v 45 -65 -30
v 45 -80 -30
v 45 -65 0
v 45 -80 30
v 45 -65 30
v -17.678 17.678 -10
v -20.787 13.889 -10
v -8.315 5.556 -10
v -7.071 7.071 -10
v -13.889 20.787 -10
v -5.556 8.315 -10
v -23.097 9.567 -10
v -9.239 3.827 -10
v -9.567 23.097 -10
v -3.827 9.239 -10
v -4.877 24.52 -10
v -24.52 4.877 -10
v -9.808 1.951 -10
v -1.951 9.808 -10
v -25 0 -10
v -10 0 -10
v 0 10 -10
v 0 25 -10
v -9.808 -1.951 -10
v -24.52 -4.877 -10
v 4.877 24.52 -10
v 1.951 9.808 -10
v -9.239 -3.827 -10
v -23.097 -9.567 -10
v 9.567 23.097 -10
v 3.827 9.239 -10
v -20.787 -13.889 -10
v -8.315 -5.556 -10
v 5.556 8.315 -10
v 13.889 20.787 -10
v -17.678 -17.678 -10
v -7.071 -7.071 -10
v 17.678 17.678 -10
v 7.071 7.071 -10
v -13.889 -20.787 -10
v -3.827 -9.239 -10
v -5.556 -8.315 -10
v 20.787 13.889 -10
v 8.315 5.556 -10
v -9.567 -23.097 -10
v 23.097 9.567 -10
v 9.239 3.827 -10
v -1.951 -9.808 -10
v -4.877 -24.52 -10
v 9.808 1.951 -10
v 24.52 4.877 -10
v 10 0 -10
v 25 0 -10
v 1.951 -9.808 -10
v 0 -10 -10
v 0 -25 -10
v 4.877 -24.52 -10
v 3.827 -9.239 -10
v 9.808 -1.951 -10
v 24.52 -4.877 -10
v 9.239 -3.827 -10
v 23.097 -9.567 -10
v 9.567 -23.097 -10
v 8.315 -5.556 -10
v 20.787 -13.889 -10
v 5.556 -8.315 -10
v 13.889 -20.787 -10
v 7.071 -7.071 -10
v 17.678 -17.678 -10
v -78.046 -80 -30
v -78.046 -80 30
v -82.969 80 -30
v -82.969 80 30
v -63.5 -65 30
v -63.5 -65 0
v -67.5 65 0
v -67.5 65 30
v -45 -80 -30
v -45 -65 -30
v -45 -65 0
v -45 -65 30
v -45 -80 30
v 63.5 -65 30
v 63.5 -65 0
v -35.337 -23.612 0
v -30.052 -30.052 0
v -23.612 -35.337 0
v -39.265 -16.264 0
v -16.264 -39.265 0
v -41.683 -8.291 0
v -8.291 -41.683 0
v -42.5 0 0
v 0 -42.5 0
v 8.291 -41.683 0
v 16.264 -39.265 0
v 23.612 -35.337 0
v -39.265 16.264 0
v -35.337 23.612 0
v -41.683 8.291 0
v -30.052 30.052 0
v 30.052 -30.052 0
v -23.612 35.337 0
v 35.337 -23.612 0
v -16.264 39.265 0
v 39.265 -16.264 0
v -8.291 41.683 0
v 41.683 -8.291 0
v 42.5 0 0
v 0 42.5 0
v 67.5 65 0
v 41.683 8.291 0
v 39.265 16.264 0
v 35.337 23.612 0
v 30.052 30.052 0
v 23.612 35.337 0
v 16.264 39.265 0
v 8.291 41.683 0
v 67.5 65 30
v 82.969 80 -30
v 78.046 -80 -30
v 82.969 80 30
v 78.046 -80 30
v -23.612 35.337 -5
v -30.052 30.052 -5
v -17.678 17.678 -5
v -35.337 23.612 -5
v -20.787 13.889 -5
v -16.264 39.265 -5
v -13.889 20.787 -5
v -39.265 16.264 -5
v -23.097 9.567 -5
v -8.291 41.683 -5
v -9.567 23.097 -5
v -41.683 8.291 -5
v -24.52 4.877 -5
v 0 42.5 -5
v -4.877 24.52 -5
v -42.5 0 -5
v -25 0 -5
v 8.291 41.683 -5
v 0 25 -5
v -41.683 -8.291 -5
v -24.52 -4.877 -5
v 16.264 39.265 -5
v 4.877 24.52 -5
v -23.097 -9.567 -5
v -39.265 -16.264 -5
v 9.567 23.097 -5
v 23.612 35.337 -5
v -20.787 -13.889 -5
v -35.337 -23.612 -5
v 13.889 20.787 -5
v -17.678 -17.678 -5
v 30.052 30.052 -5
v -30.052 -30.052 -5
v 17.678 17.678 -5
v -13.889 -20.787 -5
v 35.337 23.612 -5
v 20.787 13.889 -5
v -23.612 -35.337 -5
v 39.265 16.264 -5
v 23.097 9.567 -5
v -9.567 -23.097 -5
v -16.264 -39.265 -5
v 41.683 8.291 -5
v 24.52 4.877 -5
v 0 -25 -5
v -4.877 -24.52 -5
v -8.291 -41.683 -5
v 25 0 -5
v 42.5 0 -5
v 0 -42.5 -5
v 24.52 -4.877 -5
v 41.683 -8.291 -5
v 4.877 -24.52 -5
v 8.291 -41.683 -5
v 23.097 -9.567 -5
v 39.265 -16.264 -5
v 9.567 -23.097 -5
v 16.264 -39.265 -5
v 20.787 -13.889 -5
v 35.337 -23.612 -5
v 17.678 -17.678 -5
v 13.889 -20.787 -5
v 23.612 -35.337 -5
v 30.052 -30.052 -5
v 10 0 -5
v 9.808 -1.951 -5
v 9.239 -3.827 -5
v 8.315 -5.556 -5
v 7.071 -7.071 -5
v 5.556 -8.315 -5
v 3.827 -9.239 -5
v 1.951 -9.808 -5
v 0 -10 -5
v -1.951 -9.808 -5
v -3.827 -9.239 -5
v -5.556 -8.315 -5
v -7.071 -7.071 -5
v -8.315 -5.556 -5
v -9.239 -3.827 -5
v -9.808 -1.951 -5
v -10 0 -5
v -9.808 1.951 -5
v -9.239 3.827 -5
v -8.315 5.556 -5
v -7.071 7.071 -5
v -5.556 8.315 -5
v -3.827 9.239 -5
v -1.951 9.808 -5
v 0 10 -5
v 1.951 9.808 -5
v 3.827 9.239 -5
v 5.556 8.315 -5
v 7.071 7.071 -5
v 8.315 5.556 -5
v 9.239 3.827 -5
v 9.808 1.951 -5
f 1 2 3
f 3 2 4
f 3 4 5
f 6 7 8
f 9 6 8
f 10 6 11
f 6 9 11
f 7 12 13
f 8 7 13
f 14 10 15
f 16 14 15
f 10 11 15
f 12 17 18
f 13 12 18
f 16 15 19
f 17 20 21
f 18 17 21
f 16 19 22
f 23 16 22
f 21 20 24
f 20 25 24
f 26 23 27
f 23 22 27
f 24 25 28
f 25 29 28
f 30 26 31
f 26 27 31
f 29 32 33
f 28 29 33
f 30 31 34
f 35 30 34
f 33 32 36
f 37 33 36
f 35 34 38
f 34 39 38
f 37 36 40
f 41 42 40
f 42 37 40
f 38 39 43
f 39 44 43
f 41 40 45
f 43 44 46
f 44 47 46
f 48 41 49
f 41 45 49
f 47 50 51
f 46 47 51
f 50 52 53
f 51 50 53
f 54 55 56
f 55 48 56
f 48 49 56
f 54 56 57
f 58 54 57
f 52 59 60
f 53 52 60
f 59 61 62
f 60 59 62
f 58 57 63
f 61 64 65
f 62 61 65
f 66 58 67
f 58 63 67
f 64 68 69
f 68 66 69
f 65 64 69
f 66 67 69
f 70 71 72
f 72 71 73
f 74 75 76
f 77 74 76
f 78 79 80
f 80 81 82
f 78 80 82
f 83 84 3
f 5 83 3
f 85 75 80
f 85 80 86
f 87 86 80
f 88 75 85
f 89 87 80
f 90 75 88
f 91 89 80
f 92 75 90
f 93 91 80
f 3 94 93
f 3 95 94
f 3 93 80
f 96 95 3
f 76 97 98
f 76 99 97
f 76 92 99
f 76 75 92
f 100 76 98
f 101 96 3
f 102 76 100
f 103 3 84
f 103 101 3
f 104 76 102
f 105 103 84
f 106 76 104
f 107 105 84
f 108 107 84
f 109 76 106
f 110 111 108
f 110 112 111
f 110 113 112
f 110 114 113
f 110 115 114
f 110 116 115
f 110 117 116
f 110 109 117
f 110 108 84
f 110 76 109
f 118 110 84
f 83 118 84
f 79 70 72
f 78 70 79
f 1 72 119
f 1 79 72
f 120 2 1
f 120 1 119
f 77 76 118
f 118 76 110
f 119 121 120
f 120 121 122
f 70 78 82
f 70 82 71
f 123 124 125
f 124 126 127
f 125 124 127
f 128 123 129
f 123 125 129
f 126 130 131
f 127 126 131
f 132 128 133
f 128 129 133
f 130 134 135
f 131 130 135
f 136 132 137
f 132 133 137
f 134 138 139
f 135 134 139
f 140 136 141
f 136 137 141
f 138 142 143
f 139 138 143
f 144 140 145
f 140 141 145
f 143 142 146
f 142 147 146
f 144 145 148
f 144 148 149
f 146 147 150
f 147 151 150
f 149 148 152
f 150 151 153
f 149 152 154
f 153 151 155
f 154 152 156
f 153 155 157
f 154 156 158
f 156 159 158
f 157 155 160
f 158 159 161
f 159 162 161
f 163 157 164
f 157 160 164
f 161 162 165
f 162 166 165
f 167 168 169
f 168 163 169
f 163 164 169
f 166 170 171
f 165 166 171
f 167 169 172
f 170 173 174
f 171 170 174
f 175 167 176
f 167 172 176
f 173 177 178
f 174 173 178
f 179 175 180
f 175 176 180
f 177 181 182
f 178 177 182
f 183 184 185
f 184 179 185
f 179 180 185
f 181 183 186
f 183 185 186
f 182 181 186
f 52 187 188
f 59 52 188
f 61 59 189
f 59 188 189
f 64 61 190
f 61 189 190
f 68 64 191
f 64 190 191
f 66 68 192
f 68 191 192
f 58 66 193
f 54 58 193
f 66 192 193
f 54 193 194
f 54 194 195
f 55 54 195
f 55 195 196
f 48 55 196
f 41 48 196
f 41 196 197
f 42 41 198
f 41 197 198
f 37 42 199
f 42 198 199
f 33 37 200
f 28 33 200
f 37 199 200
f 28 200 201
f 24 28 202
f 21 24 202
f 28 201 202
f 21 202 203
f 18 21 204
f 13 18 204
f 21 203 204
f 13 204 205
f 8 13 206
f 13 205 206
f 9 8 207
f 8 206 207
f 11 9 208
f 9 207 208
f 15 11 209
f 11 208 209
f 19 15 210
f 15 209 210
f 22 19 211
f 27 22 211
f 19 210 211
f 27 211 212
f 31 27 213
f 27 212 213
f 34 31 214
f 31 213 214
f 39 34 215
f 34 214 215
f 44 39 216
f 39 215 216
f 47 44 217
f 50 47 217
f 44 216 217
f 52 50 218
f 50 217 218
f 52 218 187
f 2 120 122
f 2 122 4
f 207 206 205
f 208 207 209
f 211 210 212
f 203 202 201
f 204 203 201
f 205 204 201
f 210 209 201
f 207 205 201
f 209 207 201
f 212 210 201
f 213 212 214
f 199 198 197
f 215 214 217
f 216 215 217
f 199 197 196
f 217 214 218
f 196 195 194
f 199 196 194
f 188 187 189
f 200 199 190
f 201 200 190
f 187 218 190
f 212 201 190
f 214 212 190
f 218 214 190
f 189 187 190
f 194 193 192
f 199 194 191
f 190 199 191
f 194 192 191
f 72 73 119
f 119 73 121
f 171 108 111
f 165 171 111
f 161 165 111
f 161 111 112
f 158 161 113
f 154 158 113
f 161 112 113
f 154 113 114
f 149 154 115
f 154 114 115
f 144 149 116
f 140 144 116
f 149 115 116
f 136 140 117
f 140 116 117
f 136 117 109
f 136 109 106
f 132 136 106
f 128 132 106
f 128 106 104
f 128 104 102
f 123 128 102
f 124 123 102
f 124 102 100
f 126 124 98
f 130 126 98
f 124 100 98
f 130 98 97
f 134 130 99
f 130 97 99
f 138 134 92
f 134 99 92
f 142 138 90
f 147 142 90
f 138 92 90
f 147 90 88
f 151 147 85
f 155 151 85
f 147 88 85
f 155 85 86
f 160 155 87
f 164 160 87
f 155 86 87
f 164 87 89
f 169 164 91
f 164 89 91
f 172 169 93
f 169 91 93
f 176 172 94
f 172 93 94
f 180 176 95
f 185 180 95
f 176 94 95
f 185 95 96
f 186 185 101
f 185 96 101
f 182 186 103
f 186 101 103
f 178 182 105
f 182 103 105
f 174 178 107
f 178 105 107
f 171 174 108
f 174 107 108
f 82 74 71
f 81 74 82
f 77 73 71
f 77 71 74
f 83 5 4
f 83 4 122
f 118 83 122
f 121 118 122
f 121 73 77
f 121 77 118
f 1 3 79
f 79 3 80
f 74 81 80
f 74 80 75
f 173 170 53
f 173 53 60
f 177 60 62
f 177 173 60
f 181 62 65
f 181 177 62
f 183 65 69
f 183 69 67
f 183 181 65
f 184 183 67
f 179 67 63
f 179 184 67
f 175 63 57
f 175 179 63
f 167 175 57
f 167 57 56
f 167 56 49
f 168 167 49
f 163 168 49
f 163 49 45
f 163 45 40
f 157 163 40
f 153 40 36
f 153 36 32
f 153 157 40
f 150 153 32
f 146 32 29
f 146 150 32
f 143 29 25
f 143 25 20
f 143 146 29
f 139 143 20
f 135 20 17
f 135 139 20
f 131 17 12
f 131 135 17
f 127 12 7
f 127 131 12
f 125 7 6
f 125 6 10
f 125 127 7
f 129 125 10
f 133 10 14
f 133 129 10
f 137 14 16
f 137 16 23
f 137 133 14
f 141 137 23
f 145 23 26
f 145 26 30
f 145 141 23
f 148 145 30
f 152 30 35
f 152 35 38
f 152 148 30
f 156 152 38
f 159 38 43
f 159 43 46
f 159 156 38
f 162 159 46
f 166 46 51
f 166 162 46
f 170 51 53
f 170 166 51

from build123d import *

# Parameters (mm, degrees)
F1_DEPTH  = 30
F2_W      = 90
F2_H      = 30
F3_DEPTH  = 15
F4_R      = 42.5
F5_DEPTH  = 5
F6_R      = 10
F7_DEPTH  = 5
F8_R      = 25
F9_DEPTH  = 5
F11_DEPTH = 20


with BuildPart() as f1:
    # F0 (on Top) → F1 (new body)
    with BuildSketch(Plane.XY):
        Polygon((82.968637, 80), (-82.968637, 80), (-78.04556, -80), (78.04556, -80), align=None)
        Polygon((-63.5, -65), (-67.5, 65), (67.5, 65), (63.5, -65), align=None, mode=Mode.SUBTRACT)
    extrude(amount=F1_DEPTH)

    # F2 (on face) → F3 (cut, through all)
    with BuildSketch(Plane.XZ.offset(80)):
        with Locations((0, 15)):
            Rectangle(F2_W, F2_H)
    extrude(amount=-F3_DEPTH, mode=Mode.SUBTRACT)

    # F4 (on Top) → F5 (join)
    with BuildSketch(Plane.XY):
        Polygon((82.968637, 80), (-82.968637, 80), (-78.04556, -80), (-45, -80), (-45, -65), (45, -65), (45, -80), (78.04556, -80), align=None)
        Circle(F4_R, mode=Mode.SUBTRACT)
    extrude(amount=-F5_DEPTH)

    # F8 (on face) → F9 (join)
    with BuildSketch(Plane(origin=(0, 0, -5), x_dir=(1, 0, 0), z_dir=(0, 0, -1))):
        Polygon((-45, 80), (-78.04556, 80), (-82.968637, -80), (82.968637, -80), (78.04556, 80), (45, 80), (45, 65), (-45, 65), align=None)
        Circle(F8_R, mode=Mode.SUBTRACT)
    extrude(amount=F9_DEPTH)



with BuildPart() as f7:
    # F6 (on face) → F7 (new body)
    with BuildSketch(Plane(origin=(0, 0, -5), x_dir=(1, 0, 0), z_dir=(0, 0, -1))):
        Circle(F6_R)
    extrude(amount=F7_DEPTH)


with BuildPart() as f1_1:
    add(f1.part)

    add(f7.part)  # F11 merges F7
    # F10 (on face) → F11 (join)
    with BuildSketch(Plane(origin=(0, 0, -10), x_dir=(1, 0, 0), z_dir=(0, 0, -1))):
        Polygon((-78.04556, 80), (-82.968637, -80), (82.968637, -80), (78.04556, 80), (45, 80), (45, 65), (-45, 65), (-45, 80), align=None)
    extrude(amount=F11_DEPTH)


solid = f1_1.part
